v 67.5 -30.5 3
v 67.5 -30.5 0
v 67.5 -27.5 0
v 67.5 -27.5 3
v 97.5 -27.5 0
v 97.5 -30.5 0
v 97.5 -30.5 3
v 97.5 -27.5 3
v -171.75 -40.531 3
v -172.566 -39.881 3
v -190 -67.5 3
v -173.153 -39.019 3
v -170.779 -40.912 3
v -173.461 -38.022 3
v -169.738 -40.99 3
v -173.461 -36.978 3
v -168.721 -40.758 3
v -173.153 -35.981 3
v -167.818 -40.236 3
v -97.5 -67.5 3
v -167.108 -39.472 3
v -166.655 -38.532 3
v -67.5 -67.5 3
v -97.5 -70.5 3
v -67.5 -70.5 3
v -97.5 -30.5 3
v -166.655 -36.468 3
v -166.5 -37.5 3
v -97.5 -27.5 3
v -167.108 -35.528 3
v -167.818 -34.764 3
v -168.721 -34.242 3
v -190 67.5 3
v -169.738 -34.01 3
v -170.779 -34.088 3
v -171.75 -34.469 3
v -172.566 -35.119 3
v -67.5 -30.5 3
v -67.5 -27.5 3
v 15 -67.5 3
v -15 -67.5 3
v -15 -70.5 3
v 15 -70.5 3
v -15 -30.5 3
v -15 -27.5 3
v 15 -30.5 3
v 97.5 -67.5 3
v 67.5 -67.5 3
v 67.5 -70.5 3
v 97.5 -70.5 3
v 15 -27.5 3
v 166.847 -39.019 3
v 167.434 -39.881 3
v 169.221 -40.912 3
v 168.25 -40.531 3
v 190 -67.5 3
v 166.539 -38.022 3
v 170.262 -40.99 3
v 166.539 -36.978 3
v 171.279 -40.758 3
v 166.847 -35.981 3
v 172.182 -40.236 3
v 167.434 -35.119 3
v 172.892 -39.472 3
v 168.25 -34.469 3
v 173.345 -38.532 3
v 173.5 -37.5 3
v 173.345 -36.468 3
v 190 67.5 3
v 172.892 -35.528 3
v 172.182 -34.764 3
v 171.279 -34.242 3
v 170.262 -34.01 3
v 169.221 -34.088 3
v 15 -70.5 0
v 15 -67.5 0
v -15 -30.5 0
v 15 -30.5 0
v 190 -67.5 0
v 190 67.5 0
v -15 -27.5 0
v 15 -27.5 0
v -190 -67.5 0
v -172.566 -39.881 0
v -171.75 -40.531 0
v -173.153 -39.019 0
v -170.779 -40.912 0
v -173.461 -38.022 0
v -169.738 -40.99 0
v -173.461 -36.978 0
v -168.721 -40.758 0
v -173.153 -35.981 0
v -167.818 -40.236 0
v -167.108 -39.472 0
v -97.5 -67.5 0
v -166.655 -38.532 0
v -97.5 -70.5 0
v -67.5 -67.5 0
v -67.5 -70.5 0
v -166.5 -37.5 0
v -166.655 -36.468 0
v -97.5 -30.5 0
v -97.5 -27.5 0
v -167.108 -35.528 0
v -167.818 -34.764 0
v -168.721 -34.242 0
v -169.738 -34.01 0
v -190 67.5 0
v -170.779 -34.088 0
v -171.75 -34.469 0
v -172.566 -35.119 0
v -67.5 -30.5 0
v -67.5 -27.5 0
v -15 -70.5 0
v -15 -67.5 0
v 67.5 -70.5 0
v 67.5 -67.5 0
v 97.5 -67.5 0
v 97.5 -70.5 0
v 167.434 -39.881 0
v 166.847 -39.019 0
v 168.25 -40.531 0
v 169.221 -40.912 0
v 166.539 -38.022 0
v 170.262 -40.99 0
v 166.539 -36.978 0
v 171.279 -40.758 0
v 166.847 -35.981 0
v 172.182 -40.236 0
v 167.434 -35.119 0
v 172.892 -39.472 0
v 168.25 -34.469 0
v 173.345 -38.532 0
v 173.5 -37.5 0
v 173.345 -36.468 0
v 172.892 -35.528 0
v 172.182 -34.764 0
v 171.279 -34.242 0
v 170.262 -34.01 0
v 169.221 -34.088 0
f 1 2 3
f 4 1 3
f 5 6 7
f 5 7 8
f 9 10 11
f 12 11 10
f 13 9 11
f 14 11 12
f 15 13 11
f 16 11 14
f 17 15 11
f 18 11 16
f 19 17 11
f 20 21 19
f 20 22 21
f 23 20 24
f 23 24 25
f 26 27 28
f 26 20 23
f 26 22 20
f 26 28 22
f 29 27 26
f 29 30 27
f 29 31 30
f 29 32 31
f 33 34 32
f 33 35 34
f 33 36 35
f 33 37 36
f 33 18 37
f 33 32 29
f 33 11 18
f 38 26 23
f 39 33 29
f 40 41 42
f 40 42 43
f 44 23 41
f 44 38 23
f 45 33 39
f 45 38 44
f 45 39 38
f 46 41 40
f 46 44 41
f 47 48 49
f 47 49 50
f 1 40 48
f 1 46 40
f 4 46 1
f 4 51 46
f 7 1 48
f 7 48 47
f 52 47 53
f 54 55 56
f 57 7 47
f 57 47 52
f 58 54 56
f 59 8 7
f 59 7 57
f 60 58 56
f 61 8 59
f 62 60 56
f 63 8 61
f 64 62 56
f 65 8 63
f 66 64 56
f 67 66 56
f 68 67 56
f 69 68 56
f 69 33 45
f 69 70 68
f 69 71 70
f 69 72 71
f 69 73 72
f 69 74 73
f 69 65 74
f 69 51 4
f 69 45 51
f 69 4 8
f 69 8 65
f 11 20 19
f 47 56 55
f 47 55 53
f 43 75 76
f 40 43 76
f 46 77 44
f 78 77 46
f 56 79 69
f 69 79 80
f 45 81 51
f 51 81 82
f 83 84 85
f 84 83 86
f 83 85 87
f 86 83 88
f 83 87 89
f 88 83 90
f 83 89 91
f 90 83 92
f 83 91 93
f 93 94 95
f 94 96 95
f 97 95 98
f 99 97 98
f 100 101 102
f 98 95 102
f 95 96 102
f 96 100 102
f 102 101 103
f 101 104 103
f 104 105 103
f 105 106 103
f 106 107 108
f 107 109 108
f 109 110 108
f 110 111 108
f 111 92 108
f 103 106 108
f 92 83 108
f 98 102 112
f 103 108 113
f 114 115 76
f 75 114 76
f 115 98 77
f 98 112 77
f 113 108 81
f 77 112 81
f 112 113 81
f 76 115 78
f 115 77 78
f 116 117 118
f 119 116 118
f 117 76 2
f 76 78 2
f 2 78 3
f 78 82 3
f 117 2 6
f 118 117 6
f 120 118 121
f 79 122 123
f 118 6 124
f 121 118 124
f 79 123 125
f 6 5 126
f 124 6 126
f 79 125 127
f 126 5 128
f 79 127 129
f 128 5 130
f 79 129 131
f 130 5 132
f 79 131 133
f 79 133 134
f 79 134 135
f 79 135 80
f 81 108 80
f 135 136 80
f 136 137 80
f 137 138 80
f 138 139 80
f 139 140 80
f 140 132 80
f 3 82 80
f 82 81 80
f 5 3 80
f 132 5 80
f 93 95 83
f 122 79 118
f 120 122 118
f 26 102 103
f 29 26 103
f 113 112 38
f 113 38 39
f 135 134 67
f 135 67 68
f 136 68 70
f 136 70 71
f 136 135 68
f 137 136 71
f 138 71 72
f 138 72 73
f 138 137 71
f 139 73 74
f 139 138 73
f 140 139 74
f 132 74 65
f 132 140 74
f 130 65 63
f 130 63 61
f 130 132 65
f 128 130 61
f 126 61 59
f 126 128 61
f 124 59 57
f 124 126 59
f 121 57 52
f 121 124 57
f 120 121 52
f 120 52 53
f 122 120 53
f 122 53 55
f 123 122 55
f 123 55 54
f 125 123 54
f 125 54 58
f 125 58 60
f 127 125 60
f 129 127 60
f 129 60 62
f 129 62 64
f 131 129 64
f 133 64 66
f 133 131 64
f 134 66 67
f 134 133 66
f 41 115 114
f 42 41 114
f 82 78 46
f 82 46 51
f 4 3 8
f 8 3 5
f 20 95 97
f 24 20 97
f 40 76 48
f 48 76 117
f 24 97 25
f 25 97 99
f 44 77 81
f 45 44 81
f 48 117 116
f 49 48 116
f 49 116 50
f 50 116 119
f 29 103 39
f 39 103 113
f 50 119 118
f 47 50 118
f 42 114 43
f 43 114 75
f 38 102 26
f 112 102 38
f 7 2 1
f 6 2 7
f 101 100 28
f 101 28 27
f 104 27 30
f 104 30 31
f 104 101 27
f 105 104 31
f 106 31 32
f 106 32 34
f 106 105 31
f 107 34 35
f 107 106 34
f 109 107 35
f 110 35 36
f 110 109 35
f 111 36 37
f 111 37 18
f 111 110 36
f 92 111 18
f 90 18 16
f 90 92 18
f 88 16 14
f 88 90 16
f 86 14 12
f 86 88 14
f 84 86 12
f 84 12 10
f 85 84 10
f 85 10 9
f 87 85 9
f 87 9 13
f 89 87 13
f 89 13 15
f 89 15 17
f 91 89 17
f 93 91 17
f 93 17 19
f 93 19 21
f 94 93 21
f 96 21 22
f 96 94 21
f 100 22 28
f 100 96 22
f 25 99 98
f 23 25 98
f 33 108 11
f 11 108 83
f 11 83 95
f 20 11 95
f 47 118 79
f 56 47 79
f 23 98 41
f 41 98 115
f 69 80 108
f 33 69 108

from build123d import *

# Parameters (mm, degrees)
CROQUIS1_R              = 3.5
CROQUIS1_W              = 30
CROQUIS1_H              = 3
SALIENTE_EXTRUIR1_DEPTH = 3


with BuildPart() as part:
    # Croquis1 → Saliente-Extruir1 (new body)
    with BuildSketch(Plane.XY):
        Polygon((-190, -67.5), (-97.5, -67.5), (-97.5, -70.5), (-67.5, -70.5), (-67.5, -67.5), (-15, -67.5), (-15, -70.5), (15, -70.5), (15, -67.5), (67.5, -67.5), (67.5, -70.5), (97.5, -70.5), (97.5, -67.5), (190, -67.5), (190, 67.5), (-190, 67.5), align=None)
        with Locations((-170, -37.5)):
            Circle(CROQUIS1_R, mode=Mode.SUBTRACT)
        with Locations((170, -37.5)):
            Circle(CROQUIS1_R, mode=Mode.SUBTRACT)
        with Locations((82.5, -29)):
            Rectangle(CROQUIS1_W, CROQUIS1_H, mode=Mode.SUBTRACT)
        with Locations((0, -29)):
            Rectangle(CROQUIS1_W, CROQUIS1_H, mode=Mode.SUBTRACT)
        with Locations((-82.5, -29)):
            Rectangle(CROQUIS1_W, CROQUIS1_H, mode=Mode.SUBTRACT)
    extrude(amount=SALIENTE_EXTRUIR1_DEPTH)


solid = part.part
